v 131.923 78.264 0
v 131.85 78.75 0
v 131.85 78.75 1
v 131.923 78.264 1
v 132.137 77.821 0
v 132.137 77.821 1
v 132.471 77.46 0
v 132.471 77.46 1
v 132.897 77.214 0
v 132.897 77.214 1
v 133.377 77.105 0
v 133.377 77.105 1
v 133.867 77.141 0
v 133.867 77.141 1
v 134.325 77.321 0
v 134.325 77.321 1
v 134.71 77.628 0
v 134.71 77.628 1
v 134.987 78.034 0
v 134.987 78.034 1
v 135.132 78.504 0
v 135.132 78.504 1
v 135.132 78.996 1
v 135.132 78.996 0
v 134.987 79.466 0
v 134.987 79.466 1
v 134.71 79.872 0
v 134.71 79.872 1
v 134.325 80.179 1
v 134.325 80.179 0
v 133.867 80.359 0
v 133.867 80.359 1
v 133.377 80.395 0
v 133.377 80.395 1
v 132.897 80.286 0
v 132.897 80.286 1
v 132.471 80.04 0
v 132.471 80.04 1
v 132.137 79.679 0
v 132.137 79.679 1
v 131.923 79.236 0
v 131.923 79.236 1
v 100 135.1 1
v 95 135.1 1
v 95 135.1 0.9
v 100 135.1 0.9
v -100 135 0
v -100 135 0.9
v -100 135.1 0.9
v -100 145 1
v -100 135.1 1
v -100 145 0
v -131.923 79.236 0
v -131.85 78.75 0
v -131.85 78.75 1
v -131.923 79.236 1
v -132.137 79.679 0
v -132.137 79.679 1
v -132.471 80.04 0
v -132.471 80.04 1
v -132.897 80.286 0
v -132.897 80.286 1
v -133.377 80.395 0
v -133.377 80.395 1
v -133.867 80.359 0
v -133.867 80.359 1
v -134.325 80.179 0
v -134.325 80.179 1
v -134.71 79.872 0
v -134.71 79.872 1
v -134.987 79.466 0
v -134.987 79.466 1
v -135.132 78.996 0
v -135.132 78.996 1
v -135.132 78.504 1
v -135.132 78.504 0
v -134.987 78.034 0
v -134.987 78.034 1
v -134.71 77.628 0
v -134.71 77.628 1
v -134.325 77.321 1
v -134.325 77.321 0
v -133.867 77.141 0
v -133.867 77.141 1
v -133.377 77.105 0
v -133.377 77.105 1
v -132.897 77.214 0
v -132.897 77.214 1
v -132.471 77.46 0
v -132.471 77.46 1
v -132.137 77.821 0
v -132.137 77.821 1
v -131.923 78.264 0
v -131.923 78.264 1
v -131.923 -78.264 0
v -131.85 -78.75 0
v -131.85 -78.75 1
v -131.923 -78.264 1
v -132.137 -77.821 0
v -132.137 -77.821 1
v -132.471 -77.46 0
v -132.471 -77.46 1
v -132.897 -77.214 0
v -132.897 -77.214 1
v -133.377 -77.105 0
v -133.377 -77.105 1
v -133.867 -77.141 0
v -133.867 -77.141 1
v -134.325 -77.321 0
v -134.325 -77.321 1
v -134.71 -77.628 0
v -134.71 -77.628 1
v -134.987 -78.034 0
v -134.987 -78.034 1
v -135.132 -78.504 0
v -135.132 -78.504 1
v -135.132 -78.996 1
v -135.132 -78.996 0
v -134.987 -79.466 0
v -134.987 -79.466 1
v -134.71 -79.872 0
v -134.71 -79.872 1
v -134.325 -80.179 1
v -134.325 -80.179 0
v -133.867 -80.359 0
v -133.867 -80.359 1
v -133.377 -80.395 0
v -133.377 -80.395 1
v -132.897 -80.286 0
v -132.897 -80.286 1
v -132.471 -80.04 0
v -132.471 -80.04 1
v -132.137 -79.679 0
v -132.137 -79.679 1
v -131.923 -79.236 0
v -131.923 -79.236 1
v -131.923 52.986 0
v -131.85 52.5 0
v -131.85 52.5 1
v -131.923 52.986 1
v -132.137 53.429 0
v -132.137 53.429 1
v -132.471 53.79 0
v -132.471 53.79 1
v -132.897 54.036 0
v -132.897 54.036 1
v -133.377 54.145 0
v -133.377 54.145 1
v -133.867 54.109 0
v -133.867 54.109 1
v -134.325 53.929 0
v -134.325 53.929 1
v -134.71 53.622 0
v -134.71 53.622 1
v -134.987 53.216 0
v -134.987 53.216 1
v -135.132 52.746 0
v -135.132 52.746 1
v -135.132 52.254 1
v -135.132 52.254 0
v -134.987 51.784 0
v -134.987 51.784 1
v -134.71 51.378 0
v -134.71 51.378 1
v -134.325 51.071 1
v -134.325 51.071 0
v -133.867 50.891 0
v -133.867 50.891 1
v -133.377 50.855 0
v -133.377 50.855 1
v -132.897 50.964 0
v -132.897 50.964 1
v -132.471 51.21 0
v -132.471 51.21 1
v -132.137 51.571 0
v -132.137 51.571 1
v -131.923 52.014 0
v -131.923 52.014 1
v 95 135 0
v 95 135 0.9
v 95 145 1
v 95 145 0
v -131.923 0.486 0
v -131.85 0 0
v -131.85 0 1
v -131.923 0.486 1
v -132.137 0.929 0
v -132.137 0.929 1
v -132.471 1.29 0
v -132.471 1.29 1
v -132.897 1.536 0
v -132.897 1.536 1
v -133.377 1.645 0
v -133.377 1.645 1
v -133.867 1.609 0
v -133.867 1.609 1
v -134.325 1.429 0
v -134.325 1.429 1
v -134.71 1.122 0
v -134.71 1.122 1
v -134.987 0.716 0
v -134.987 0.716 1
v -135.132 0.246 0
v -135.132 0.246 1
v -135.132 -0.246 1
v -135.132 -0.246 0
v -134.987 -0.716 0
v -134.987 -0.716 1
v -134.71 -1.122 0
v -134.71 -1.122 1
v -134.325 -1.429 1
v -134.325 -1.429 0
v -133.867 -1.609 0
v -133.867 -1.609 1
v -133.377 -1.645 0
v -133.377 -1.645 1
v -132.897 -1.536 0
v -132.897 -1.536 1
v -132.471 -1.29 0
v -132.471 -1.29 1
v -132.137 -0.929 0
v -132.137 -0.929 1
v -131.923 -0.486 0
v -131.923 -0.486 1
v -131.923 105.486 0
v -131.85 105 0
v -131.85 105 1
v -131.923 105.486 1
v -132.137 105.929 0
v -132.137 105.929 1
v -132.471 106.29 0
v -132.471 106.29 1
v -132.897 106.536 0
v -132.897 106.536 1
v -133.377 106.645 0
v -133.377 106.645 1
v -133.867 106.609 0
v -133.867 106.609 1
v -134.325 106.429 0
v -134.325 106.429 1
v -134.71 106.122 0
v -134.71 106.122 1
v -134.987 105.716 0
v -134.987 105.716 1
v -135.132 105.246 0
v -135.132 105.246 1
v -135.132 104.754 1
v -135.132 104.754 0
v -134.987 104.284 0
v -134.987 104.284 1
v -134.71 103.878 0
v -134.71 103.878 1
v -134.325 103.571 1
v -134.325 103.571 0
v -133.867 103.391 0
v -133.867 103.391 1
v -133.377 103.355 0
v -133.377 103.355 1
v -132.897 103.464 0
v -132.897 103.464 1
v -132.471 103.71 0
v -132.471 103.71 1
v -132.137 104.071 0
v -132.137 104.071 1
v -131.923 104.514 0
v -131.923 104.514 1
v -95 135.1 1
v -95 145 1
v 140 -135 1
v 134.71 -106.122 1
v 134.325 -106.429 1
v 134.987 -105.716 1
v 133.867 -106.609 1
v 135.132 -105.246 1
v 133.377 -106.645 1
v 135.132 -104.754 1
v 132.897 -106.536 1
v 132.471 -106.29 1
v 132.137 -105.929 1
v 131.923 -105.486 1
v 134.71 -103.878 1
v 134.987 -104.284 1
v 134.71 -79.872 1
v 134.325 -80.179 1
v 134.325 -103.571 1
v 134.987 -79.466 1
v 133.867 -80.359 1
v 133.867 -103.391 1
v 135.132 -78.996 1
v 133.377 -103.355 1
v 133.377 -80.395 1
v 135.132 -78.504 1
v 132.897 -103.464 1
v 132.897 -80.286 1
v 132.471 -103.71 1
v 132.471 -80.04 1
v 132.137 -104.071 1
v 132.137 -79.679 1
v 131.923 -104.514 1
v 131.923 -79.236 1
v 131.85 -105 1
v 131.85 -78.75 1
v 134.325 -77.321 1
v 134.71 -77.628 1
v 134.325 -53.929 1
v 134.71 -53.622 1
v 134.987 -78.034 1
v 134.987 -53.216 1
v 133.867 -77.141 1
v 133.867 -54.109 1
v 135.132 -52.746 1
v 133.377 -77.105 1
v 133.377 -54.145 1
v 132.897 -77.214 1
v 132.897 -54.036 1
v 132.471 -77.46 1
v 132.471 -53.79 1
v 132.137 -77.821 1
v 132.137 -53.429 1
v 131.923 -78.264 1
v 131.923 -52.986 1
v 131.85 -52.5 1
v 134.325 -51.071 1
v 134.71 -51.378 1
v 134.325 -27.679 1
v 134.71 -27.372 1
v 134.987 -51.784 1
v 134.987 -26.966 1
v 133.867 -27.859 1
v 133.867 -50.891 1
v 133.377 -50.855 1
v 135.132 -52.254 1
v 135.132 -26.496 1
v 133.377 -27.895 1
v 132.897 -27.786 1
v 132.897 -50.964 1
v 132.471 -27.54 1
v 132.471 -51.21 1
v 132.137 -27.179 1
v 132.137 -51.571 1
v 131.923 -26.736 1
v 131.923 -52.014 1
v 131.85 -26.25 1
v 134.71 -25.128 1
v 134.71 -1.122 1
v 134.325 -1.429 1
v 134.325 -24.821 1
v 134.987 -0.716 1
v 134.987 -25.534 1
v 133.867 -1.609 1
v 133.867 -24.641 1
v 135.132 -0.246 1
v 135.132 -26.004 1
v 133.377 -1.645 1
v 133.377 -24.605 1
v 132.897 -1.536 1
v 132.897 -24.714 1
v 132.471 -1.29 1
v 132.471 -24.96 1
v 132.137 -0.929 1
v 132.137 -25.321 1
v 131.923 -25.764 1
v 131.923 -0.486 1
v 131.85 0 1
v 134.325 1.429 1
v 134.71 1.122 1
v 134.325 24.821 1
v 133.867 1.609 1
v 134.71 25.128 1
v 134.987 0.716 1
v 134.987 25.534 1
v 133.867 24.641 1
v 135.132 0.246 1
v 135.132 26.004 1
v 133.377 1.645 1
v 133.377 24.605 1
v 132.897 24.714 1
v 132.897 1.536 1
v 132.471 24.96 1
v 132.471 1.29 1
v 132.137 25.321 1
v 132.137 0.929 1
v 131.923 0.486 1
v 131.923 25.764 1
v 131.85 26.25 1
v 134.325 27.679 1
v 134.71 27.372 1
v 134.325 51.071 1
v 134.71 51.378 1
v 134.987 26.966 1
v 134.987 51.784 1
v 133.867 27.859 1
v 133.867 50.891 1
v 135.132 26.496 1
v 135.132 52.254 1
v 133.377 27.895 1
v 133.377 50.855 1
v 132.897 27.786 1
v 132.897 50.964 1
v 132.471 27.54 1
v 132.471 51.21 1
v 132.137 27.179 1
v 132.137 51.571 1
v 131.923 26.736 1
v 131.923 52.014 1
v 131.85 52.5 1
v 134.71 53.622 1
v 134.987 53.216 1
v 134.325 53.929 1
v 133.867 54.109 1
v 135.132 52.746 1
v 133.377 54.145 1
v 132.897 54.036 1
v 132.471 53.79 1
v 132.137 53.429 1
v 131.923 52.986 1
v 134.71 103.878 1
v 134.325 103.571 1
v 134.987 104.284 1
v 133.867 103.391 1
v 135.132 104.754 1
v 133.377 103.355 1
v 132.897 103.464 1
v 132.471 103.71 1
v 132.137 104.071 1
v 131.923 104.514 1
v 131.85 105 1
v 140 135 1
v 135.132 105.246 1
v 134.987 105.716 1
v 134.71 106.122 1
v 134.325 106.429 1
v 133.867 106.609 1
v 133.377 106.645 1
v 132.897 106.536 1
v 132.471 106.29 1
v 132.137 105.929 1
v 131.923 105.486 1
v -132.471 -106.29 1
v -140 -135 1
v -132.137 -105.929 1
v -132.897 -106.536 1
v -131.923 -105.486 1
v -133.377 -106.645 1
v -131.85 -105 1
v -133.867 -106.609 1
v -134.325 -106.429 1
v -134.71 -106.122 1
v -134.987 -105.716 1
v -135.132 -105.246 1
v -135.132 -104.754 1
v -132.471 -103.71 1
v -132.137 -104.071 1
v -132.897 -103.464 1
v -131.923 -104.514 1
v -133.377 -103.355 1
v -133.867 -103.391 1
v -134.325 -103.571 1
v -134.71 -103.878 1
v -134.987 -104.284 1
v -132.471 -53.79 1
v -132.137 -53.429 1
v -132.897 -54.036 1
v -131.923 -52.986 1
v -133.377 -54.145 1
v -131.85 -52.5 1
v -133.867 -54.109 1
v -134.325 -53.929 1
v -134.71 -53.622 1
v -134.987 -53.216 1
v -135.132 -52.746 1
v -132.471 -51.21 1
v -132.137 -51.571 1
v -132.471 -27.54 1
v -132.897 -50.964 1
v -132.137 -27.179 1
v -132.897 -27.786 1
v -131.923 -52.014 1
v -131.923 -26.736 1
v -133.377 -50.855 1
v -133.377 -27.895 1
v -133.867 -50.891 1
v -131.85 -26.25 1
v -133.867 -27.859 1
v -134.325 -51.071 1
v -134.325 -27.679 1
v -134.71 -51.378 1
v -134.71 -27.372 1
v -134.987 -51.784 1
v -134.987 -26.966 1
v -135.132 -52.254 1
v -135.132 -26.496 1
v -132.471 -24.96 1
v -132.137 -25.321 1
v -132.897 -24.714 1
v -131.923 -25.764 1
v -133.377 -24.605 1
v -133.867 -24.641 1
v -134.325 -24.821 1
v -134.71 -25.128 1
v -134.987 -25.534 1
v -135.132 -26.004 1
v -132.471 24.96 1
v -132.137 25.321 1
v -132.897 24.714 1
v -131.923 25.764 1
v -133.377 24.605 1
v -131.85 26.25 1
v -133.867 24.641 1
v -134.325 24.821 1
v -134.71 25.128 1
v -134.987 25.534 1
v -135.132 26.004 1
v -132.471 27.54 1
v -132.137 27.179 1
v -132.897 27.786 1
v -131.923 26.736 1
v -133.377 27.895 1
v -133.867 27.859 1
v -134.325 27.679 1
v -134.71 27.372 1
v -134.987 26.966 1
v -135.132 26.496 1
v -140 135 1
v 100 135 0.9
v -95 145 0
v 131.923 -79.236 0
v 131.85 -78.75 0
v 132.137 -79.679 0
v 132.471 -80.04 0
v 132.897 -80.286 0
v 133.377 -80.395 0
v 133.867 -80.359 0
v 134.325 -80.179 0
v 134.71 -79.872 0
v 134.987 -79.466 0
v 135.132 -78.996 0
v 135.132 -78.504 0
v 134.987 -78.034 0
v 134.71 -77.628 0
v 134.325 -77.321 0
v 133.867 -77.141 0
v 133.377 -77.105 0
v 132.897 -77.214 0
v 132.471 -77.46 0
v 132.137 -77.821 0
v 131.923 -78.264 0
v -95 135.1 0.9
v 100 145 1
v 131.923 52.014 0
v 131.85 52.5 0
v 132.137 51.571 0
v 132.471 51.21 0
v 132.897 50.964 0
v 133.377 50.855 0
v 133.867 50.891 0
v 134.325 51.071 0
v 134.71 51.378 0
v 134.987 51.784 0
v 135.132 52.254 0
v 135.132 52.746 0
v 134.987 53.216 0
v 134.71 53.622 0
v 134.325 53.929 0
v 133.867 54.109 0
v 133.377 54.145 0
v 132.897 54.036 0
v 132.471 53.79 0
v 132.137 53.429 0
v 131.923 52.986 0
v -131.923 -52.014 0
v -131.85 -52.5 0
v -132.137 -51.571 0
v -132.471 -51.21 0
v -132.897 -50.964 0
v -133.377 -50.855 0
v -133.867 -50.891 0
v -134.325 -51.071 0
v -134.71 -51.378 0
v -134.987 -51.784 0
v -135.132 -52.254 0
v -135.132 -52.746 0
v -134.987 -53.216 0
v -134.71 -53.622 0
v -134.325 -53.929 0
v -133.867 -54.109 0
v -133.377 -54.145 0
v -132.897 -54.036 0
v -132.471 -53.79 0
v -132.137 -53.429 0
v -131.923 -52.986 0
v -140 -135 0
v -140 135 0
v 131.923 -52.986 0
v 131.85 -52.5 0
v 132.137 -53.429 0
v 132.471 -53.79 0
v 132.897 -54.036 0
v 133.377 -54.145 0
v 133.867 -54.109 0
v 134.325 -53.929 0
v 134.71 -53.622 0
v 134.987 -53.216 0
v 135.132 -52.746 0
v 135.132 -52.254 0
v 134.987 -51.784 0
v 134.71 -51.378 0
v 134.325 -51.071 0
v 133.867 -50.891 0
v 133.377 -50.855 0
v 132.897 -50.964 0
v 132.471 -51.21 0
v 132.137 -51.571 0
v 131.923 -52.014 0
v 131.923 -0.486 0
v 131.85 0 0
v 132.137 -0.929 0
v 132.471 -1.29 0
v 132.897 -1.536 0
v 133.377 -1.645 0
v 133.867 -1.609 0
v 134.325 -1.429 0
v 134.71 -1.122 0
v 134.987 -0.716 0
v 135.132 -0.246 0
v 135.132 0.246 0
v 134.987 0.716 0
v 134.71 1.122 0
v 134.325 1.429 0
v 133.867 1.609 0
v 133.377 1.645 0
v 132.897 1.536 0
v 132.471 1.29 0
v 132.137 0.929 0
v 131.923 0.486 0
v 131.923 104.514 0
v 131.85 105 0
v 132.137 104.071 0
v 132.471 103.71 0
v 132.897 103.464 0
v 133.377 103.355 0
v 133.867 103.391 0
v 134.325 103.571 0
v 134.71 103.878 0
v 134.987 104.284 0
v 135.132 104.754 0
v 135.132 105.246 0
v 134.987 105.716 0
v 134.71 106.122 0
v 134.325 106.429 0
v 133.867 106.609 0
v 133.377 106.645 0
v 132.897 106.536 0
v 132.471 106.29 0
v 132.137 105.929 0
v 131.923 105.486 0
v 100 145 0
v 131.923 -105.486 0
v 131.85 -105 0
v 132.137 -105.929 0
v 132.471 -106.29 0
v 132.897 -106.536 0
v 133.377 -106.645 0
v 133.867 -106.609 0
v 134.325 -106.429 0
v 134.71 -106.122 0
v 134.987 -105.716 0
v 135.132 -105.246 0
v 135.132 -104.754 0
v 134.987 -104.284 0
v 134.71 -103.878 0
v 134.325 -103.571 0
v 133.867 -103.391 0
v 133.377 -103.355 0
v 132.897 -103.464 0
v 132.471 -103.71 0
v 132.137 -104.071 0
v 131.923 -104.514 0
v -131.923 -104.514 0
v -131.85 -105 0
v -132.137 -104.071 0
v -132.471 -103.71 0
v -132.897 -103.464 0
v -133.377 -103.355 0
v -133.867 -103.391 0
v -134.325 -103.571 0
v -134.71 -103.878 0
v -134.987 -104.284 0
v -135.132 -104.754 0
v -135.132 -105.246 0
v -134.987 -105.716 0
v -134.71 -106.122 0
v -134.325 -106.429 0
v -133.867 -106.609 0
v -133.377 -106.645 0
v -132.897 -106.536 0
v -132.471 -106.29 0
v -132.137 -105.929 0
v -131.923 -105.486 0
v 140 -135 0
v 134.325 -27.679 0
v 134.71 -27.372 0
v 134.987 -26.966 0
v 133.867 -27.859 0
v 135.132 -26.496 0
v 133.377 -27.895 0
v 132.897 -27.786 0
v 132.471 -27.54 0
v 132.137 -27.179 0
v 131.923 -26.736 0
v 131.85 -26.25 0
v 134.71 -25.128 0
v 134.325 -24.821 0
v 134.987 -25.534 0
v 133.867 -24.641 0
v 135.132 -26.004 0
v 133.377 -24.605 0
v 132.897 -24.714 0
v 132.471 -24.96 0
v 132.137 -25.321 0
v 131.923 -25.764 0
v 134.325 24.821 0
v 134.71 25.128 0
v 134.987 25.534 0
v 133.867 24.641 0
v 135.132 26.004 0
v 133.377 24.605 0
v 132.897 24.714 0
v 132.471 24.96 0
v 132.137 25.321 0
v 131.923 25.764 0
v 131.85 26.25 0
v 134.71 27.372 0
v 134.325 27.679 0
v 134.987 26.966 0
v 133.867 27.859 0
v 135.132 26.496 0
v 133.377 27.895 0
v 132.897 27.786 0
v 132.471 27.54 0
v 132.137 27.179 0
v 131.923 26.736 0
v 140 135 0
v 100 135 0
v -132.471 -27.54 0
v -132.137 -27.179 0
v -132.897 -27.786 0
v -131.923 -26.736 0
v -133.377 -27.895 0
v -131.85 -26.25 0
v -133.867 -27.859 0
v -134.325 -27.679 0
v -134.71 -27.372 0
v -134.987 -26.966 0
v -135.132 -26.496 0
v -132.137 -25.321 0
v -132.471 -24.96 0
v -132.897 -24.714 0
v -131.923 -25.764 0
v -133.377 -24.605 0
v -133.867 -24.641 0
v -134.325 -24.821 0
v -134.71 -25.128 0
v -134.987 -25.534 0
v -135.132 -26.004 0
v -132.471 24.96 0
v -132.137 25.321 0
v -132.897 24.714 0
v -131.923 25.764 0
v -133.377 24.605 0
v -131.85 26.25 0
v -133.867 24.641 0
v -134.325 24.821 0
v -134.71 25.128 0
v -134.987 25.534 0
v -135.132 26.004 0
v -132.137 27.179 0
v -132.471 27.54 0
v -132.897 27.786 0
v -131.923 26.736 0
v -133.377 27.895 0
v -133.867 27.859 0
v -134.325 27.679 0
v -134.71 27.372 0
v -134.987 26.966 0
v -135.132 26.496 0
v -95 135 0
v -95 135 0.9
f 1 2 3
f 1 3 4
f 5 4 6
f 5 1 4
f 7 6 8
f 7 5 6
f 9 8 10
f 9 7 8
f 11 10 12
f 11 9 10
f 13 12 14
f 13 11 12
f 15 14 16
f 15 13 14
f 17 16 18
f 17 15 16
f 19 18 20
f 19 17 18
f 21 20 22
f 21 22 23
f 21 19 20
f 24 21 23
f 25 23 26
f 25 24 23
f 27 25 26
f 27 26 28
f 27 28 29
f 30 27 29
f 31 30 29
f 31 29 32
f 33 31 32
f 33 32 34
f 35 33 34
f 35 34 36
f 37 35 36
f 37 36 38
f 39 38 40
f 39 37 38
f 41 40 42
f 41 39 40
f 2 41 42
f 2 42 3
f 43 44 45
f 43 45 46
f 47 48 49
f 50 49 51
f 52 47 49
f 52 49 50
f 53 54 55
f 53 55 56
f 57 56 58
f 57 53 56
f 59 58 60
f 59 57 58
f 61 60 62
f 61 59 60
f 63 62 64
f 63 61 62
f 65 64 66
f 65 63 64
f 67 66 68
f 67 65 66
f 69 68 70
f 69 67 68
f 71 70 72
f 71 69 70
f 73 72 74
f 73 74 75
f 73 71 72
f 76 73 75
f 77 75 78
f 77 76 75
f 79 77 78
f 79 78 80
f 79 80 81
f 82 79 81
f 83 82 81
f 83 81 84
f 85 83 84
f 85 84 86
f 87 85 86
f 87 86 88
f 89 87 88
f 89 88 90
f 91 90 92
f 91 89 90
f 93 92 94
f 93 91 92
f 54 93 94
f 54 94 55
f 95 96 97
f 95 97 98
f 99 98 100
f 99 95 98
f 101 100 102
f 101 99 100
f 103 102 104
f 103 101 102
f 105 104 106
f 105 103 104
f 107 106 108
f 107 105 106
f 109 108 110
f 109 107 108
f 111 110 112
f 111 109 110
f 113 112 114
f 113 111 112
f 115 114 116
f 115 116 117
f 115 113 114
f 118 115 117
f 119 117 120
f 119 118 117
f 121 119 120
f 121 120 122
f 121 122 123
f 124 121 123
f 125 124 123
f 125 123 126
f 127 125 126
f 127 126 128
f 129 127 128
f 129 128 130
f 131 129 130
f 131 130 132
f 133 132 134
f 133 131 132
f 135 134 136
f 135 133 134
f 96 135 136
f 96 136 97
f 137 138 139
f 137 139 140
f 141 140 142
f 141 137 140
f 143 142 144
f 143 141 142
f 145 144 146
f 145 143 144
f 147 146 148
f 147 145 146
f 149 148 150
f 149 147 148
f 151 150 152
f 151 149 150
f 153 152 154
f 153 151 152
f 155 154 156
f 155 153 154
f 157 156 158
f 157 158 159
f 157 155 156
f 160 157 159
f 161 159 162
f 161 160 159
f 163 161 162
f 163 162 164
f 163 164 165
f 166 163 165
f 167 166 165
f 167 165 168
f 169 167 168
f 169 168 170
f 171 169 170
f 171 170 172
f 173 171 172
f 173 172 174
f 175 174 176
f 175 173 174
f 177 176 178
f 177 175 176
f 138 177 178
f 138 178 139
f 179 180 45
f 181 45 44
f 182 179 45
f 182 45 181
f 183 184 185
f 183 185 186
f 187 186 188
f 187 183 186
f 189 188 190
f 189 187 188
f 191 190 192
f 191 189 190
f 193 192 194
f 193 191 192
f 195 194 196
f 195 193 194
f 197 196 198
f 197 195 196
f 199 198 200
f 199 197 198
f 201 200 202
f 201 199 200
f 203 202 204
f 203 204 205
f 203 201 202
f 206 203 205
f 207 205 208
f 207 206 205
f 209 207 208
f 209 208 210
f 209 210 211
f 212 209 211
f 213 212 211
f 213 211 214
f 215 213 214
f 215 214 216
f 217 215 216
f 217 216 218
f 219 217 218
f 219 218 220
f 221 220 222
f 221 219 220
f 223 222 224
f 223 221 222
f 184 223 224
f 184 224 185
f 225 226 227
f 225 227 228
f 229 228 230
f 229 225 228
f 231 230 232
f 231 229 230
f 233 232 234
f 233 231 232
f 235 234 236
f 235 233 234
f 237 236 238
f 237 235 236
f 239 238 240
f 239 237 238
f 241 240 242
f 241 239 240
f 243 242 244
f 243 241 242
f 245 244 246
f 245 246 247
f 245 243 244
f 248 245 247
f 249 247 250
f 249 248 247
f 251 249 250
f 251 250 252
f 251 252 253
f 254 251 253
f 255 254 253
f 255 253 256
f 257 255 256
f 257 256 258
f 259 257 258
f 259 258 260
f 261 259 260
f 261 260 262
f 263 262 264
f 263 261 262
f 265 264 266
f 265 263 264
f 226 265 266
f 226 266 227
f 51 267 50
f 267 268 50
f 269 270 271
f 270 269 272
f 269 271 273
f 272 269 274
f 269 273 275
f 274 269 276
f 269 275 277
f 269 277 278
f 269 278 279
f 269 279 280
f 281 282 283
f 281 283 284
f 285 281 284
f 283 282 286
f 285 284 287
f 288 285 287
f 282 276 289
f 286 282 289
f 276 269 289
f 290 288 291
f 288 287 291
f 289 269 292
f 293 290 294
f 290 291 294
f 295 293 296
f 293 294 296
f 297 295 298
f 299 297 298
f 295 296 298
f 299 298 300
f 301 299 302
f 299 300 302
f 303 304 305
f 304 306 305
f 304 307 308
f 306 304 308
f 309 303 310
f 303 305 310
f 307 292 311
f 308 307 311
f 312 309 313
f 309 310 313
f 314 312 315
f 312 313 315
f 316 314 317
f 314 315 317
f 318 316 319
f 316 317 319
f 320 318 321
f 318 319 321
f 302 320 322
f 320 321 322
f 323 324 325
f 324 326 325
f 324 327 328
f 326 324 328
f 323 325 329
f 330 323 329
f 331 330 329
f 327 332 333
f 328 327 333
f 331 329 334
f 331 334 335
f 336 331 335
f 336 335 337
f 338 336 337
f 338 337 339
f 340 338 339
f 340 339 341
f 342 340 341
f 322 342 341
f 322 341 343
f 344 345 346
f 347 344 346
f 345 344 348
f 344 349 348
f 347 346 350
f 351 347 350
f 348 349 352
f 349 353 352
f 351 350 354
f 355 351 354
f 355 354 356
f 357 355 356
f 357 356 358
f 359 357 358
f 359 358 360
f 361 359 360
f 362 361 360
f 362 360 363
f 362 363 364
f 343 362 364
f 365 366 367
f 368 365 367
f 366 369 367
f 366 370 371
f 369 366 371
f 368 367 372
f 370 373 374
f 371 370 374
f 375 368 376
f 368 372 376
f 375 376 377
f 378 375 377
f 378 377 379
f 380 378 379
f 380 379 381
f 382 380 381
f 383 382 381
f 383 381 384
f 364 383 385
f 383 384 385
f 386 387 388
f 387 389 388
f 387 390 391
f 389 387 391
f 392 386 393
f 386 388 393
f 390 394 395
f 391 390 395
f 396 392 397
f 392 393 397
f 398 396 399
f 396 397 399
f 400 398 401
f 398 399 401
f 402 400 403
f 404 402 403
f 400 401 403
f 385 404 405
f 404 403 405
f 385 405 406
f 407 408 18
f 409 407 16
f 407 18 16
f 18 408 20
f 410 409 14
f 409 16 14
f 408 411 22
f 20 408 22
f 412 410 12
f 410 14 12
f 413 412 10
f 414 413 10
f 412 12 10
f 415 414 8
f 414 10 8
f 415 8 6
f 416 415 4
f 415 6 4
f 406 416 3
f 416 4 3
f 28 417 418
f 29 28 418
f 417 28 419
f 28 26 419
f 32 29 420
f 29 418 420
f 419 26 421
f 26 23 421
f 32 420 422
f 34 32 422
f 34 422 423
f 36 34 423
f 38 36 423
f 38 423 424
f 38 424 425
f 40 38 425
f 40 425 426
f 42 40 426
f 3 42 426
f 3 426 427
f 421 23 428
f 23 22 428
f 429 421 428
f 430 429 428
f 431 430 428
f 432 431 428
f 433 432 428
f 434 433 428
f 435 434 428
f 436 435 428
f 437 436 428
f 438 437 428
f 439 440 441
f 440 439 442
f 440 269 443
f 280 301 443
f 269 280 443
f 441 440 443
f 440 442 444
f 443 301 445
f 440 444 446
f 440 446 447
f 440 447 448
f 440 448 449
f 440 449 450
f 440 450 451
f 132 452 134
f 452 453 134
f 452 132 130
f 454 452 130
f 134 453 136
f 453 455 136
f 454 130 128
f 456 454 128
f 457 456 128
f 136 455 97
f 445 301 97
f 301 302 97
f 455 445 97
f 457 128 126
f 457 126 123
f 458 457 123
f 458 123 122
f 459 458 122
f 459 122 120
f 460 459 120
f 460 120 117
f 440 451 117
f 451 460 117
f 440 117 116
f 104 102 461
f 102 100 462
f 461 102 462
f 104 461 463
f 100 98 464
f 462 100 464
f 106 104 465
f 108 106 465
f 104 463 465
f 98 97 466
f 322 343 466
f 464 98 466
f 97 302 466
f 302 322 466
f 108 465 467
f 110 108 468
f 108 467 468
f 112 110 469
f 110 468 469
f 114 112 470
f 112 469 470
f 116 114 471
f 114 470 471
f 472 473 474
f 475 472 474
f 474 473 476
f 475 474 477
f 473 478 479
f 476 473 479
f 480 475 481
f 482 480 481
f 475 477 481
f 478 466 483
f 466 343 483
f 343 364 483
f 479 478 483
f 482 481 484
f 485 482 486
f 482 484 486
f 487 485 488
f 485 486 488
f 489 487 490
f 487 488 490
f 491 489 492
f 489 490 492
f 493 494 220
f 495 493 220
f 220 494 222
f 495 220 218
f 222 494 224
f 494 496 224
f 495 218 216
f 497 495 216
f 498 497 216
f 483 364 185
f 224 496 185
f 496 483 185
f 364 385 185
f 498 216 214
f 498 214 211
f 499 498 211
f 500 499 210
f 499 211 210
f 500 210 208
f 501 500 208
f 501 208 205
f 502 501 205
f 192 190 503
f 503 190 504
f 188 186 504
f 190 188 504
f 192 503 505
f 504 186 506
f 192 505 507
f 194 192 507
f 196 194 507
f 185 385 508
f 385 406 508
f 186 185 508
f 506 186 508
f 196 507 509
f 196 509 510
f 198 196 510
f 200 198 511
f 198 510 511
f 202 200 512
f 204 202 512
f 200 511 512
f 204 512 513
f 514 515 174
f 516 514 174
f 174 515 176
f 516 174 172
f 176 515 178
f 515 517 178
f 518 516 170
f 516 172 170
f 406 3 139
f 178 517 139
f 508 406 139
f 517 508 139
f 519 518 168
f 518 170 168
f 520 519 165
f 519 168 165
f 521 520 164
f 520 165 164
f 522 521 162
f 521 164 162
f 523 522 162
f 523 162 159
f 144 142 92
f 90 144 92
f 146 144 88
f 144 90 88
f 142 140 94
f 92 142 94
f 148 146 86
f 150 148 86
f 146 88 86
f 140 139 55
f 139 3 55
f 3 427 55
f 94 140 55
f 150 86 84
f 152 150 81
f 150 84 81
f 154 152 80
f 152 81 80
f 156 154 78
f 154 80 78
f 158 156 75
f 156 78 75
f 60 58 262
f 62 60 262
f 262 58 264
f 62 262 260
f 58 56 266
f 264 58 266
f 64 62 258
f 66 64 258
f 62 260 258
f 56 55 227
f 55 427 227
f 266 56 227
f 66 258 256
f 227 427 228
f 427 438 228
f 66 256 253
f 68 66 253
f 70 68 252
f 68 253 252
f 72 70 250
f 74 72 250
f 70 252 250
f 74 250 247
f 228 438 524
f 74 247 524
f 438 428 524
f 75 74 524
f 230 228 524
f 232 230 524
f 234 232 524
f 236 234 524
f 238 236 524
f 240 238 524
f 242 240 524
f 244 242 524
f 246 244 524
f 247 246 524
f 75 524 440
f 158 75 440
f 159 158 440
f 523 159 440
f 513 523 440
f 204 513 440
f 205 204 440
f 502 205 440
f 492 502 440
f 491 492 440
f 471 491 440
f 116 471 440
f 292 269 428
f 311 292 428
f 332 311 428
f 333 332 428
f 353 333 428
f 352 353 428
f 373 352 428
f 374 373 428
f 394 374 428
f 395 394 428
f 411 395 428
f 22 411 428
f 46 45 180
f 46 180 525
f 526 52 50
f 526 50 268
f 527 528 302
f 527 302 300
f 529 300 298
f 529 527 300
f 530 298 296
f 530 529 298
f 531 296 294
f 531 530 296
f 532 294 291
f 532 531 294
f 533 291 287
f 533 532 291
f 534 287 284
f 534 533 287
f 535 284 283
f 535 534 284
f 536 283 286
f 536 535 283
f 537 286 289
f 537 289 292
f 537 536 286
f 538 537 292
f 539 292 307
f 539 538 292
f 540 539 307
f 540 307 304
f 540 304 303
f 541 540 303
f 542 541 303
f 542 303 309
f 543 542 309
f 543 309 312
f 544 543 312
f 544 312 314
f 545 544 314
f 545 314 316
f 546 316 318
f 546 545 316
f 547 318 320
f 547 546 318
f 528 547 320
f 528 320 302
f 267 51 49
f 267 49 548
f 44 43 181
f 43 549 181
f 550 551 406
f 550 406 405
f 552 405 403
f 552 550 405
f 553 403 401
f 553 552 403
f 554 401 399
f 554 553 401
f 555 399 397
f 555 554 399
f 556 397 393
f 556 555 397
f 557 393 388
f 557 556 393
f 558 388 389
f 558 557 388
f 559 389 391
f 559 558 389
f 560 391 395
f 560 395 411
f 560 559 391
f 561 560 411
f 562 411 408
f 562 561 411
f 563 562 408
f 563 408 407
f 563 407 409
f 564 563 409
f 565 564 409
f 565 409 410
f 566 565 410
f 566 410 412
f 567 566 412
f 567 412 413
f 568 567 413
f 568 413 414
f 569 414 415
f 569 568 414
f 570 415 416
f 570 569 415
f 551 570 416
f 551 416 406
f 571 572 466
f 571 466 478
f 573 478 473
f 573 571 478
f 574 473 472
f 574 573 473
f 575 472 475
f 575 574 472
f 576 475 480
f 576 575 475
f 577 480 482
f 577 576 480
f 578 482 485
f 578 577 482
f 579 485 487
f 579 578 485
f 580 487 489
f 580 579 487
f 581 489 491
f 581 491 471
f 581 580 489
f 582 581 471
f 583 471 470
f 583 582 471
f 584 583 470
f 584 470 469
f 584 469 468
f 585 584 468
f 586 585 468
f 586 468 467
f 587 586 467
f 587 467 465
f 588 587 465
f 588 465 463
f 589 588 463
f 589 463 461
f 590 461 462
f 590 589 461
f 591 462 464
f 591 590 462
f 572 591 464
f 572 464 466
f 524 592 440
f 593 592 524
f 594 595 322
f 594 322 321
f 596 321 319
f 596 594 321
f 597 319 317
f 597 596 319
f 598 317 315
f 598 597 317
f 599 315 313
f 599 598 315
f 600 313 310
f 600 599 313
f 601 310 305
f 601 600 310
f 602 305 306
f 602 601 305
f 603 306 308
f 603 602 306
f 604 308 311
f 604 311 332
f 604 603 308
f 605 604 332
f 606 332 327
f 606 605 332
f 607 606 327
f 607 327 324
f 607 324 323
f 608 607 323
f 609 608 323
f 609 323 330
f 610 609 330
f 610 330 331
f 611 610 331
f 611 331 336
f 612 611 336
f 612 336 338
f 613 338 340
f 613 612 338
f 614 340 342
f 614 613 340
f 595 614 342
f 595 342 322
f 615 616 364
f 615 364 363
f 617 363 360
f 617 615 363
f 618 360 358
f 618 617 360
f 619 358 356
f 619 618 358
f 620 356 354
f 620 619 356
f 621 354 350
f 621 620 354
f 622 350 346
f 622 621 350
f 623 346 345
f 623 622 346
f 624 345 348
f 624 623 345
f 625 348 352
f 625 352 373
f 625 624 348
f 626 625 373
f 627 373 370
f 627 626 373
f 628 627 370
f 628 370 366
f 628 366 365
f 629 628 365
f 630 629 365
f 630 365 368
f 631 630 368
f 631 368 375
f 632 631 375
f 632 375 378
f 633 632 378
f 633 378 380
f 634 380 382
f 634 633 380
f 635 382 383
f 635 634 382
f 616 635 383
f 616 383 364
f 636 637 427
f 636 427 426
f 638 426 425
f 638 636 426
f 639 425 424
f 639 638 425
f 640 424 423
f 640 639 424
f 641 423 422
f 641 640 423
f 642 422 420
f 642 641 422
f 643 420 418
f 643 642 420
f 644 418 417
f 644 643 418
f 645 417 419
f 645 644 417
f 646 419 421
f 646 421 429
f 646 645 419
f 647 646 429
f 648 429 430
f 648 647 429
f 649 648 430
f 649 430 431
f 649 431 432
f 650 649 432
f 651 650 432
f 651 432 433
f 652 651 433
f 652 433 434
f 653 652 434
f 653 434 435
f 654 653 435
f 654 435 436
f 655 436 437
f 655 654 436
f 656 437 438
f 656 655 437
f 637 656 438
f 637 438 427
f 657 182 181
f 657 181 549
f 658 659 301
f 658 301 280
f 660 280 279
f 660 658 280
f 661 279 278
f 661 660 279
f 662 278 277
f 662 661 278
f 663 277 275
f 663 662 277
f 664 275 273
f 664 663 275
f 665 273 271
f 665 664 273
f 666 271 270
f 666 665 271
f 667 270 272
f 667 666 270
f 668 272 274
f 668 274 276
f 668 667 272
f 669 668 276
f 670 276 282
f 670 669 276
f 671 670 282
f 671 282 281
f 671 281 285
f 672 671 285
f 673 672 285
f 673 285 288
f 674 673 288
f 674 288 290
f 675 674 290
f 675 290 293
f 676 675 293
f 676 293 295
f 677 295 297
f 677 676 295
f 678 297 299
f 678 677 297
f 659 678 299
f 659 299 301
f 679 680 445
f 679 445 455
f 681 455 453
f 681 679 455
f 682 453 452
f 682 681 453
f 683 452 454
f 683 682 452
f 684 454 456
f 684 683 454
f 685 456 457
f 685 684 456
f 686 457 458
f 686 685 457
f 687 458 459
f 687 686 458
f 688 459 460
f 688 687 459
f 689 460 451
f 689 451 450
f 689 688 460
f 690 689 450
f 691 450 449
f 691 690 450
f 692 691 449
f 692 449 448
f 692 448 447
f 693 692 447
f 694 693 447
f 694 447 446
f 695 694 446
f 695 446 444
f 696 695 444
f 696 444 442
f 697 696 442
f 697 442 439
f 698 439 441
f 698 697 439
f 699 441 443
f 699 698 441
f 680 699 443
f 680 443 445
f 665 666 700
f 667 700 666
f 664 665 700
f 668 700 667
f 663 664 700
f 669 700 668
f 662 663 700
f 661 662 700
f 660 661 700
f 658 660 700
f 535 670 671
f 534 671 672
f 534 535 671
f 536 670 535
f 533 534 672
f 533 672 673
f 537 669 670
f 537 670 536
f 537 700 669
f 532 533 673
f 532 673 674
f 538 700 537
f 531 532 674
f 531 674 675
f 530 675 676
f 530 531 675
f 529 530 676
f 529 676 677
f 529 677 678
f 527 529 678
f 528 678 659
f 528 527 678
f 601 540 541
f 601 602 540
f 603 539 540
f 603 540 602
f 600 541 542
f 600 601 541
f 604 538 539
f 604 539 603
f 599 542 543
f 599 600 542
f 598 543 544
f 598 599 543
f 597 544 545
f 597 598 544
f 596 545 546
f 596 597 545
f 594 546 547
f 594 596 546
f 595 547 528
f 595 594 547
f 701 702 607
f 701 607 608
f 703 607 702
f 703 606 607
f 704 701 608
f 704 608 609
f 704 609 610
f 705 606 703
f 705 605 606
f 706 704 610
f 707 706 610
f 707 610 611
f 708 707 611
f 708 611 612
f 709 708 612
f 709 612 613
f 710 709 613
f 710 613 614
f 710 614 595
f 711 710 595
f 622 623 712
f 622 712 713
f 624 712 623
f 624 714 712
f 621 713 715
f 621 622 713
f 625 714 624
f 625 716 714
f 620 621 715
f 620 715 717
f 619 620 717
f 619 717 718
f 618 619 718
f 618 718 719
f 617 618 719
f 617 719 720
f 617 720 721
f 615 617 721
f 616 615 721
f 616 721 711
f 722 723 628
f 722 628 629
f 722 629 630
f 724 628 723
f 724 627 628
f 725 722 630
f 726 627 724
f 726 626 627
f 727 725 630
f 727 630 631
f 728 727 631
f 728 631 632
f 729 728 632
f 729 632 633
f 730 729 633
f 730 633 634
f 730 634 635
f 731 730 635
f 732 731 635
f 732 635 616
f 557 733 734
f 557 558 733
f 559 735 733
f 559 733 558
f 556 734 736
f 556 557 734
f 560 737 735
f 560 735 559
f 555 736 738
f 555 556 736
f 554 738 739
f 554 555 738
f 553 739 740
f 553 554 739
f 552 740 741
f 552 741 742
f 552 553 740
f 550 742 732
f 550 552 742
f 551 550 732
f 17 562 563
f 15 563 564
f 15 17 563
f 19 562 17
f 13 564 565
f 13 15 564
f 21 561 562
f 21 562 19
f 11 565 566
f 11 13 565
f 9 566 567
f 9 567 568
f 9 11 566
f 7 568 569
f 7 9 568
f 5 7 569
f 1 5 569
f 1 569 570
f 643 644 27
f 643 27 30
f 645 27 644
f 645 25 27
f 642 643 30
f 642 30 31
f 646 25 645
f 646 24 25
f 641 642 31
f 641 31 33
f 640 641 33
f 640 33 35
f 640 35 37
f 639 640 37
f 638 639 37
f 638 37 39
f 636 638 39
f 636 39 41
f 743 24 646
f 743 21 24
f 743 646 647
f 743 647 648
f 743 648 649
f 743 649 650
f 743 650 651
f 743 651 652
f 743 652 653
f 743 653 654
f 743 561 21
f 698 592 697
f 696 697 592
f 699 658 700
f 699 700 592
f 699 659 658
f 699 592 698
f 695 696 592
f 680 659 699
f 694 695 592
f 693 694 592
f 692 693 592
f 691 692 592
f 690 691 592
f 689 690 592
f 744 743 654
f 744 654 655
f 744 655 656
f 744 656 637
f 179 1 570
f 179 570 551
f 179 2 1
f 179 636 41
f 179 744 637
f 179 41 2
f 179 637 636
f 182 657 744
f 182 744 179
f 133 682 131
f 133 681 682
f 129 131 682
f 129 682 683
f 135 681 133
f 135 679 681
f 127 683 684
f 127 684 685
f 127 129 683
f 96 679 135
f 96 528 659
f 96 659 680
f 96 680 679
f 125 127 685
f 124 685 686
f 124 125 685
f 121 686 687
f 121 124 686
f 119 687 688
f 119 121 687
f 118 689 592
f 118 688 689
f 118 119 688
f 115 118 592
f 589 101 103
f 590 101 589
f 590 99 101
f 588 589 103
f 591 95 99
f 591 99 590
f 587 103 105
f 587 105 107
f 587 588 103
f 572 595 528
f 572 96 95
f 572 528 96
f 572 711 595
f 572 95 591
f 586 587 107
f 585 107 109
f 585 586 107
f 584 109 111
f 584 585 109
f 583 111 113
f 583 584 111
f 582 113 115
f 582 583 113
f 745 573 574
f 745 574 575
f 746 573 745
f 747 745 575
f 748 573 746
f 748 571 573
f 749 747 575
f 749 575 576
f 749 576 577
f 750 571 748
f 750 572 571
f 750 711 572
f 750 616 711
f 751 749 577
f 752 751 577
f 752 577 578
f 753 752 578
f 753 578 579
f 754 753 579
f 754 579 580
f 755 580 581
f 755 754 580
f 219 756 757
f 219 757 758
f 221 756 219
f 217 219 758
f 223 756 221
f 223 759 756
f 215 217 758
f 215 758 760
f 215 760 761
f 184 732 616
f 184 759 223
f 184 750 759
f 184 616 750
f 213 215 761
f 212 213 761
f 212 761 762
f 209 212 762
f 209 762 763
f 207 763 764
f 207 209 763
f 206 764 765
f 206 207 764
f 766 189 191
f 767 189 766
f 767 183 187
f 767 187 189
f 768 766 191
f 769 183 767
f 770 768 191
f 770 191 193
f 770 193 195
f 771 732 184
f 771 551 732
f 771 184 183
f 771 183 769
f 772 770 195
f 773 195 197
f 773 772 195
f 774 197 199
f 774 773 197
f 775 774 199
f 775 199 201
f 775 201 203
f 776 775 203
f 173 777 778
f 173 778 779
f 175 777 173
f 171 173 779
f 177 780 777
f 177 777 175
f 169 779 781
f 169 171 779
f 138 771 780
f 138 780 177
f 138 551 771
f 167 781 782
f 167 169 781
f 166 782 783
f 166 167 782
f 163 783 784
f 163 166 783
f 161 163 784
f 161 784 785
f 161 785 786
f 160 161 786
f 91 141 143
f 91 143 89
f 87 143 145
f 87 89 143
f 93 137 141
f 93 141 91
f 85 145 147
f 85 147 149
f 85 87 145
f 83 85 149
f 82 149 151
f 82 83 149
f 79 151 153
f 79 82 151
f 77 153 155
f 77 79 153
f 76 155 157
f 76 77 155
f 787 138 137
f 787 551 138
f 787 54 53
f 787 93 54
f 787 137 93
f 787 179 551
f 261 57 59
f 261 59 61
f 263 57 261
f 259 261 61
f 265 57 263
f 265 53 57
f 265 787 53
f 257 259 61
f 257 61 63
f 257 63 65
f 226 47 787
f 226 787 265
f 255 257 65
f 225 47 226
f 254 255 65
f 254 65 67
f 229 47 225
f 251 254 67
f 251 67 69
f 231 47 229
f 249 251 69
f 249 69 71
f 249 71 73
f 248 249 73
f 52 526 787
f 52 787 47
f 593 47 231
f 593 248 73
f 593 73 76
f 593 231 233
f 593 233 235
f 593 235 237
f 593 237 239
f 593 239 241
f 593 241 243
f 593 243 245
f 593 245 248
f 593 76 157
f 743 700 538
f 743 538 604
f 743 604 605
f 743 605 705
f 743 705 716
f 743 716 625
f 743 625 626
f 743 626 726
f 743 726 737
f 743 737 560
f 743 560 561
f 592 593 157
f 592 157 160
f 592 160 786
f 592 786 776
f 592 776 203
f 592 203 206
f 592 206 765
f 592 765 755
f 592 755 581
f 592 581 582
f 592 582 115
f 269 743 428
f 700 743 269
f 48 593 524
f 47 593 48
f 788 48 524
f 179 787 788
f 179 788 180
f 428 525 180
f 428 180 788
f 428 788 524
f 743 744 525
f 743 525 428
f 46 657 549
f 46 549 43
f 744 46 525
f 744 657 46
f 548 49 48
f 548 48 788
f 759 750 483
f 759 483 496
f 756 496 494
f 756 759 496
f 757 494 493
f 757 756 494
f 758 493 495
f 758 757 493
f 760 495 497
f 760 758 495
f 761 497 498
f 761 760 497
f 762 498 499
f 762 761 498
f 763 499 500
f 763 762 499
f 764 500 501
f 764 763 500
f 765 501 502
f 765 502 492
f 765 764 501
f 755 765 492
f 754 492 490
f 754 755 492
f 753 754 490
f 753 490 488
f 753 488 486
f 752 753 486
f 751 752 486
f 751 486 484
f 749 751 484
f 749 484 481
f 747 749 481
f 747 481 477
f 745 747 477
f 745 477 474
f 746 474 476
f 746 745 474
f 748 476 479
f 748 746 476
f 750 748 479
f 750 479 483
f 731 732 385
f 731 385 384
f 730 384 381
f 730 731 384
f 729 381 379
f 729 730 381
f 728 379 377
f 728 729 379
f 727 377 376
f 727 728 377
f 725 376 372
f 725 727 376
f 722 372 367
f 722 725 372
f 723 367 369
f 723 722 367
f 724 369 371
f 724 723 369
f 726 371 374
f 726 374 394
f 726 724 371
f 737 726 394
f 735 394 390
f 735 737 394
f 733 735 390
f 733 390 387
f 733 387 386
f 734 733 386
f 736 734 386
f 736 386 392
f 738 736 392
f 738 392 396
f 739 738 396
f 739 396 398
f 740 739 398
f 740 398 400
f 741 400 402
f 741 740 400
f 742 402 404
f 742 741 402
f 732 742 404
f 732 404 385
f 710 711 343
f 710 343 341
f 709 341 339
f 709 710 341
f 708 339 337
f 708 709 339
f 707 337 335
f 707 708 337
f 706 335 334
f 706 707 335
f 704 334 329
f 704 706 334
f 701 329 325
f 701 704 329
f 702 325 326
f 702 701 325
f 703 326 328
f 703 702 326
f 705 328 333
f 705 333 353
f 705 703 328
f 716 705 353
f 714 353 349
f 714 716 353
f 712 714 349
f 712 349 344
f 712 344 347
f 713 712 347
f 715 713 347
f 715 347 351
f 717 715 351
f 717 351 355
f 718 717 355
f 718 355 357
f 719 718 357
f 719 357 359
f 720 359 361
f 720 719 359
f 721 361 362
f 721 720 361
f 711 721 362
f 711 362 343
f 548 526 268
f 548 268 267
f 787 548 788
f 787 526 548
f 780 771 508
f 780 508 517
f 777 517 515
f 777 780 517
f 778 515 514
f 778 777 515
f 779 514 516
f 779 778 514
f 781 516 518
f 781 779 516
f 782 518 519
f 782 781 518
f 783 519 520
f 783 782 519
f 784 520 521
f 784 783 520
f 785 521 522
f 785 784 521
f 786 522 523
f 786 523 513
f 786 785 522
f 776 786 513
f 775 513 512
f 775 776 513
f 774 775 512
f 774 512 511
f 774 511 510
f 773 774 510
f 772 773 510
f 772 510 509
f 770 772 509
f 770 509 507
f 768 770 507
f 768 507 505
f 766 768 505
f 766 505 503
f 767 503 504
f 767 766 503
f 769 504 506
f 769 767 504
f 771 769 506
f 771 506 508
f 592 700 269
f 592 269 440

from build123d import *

# Parameters (mm, degrees)
SKETCH1_R           = 1.65
BOSS_EXTRUDE1_DEPTH = 1
SKETCH2_W           = 5
SKETCH2_H           = 0.1
CUT_EXTRUDE1_DEPTH  = 0.1


with BuildPart() as part:
    # Sketch1 → Boss-Extrude1 (new body)
    with BuildSketch(Plane.XY):
        Polygon((-140, 135), (-100, 135), (-100, 145), (-95, 145), (-95, 135), (95, 135), (95, 145), (100, 145), (100, 135), (140, 135), (140, -135), (-140, -135), align=None)
        with Locations((-133.5, 0)):
            Circle(SKETCH1_R, mode=Mode.SUBTRACT)
        with Locations((-133.5, 26.25)):
            Circle(SKETCH1_R, mode=Mode.SUBTRACT)
        with Locations((-133.5, 52.5)):
            Circle(SKETCH1_R, mode=Mode.SUBTRACT)
        with Locations((-133.5, 78.75)):
            Circle(SKETCH1_R, mode=Mode.SUBTRACT)
        with Locations((-133.5, 105)):
            Circle(SKETCH1_R, mode=Mode.SUBTRACT)
        with Locations((-133.5, -26.25)):
            Circle(SKETCH1_R, mode=Mode.SUBTRACT)
        with Locations((-133.5, -52.5)):
            Circle(SKETCH1_R, mode=Mode.SUBTRACT)
        with Locations((-133.5, -78.75)):
            Circle(SKETCH1_R, mode=Mode.SUBTRACT)
        with Locations((-133.5, -105)):
            Circle(SKETCH1_R, mode=Mode.SUBTRACT)
        with Locations(Location((133.5, -105, 0), (0, 0, 180))):
            Circle(SKETCH1_R, mode=Mode.SUBTRACT)
        with Locations(Location((133.5, -78.75, 0), (0, 0, 180))):
            Circle(SKETCH1_R, mode=Mode.SUBTRACT)
        with Locations(Location((133.5, -52.5, 0), (0, 0, 180))):
            Circle(SKETCH1_R, mode=Mode.SUBTRACT)
        with Locations(Location((133.5, -26.25, 0), (0, 0, 180))):
            Circle(SKETCH1_R, mode=Mode.SUBTRACT)
        with Locations(Location((133.5, 105, 0), (0, 0, 180))):
            Circle(SKETCH1_R, mode=Mode.SUBTRACT)
        with Locations(Location((133.5, 78.75, 0), (0, 0, 180))):
            Circle(SKETCH1_R, mode=Mode.SUBTRACT)
        with Locations(Location((133.5, 52.5, 0), (0, 0, 180))):
            Circle(SKETCH1_R, mode=Mode.SUBTRACT)
        with Locations(Location((133.5, 26.25, 0), (0, 0, 180))):
            Circle(SKETCH1_R, mode=Mode.SUBTRACT)
        with Locations(Location((133.5, 0, 0), (0, 0, 180))):
            Circle(SKETCH1_R, mode=Mode.SUBTRACT)
    extrude(amount=BOSS_EXTRUDE1_DEPTH)

    # Sketch2 → Cut-Extrude1 (cut)
    with BuildSketch(Plane.XY.offset(1)):
        with Locations((-97.5, 135.05)):
            Rectangle(SKETCH2_W, SKETCH2_H)
        with Locations((97.5, 135.05)):
            Rectangle(SKETCH2_W, SKETCH2_H)
    extrude(amount=-CUT_EXTRUDE1_DEPTH, mode=Mode.SUBTRACT)


solid = part.part
